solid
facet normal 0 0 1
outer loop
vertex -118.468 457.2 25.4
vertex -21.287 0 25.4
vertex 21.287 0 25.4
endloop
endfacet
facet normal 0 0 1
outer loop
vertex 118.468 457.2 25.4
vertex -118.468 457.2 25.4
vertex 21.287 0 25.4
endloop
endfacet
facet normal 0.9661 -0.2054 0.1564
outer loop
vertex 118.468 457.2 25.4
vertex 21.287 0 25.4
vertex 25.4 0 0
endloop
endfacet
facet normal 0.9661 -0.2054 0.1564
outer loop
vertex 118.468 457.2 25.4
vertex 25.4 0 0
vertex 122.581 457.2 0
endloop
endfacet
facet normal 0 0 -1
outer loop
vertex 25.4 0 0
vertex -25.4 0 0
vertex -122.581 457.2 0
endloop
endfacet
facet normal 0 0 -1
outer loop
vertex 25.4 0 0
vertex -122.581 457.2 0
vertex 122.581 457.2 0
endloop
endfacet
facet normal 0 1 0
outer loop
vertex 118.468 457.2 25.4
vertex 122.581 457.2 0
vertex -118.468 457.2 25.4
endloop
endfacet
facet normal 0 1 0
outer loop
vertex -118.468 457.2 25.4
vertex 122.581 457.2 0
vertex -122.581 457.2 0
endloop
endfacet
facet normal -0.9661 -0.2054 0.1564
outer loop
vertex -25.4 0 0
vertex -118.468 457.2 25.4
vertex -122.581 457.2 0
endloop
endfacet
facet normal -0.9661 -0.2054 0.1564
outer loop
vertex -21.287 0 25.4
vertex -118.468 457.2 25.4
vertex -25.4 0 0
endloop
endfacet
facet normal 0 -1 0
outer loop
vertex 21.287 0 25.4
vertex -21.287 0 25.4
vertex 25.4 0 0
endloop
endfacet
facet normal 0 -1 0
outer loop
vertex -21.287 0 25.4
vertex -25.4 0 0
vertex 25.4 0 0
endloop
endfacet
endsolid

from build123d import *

# Parameters (mm, degrees)
F2_DEPTH   = 25.4
F3_SIZE2   = 4.022955
F3_SIZE    = 25.39999
F3_2_SIZE2 = 4.022955
F3_2_SIZE  = 25.39999


# Not quite as in the source:
# - a fillet or chamfer is up to 0.001 mm smaller than in the source, because OpenCascade refuses the exact size


with BuildPart() as f2:
    # F1 (on Top) → F2 (new body)
    with BuildSketch(Plane.XY):
        Polygon((-122.5808599955, 457.2), (-25.4, 0), (25.4, 0), (122.5808599955, 457.2), align=None)
    extrude(amount=F2_DEPTH)

    # F3 (size 25.4 and 4.0229647842 in the source; OpenCascade refuses exactly that, so slightly less here)
    f3_edges = [f2.edges().sort_by_distance(p)[0] for p in [
        (-73.99043, 228.6, 25.4),
    ]]
    f3_side = f2.faces().sort_by_distance((-73.99043, 228.6, 12.7))[0]
    chamfer(f3_edges, length=F3_SIZE, length2=F3_SIZE2, reference=f3_side)

    # F3#2 (size 25.4 and 4.0229647842 in the source; OpenCascade refuses exactly that, so slightly less here)
    f3_2_edges = [f2.edges().sort_by_distance(p)[0] for p in [
        (73.99043, 228.6, 25.4),
    ]]
    f3_2_side = f2.faces().sort_by_distance((73.99043, 228.6, 12.7))[0]
    chamfer(f3_2_edges, length=F3_2_SIZE, length2=F3_2_SIZE2, reference=f3_2_side)


solid = f2.part
